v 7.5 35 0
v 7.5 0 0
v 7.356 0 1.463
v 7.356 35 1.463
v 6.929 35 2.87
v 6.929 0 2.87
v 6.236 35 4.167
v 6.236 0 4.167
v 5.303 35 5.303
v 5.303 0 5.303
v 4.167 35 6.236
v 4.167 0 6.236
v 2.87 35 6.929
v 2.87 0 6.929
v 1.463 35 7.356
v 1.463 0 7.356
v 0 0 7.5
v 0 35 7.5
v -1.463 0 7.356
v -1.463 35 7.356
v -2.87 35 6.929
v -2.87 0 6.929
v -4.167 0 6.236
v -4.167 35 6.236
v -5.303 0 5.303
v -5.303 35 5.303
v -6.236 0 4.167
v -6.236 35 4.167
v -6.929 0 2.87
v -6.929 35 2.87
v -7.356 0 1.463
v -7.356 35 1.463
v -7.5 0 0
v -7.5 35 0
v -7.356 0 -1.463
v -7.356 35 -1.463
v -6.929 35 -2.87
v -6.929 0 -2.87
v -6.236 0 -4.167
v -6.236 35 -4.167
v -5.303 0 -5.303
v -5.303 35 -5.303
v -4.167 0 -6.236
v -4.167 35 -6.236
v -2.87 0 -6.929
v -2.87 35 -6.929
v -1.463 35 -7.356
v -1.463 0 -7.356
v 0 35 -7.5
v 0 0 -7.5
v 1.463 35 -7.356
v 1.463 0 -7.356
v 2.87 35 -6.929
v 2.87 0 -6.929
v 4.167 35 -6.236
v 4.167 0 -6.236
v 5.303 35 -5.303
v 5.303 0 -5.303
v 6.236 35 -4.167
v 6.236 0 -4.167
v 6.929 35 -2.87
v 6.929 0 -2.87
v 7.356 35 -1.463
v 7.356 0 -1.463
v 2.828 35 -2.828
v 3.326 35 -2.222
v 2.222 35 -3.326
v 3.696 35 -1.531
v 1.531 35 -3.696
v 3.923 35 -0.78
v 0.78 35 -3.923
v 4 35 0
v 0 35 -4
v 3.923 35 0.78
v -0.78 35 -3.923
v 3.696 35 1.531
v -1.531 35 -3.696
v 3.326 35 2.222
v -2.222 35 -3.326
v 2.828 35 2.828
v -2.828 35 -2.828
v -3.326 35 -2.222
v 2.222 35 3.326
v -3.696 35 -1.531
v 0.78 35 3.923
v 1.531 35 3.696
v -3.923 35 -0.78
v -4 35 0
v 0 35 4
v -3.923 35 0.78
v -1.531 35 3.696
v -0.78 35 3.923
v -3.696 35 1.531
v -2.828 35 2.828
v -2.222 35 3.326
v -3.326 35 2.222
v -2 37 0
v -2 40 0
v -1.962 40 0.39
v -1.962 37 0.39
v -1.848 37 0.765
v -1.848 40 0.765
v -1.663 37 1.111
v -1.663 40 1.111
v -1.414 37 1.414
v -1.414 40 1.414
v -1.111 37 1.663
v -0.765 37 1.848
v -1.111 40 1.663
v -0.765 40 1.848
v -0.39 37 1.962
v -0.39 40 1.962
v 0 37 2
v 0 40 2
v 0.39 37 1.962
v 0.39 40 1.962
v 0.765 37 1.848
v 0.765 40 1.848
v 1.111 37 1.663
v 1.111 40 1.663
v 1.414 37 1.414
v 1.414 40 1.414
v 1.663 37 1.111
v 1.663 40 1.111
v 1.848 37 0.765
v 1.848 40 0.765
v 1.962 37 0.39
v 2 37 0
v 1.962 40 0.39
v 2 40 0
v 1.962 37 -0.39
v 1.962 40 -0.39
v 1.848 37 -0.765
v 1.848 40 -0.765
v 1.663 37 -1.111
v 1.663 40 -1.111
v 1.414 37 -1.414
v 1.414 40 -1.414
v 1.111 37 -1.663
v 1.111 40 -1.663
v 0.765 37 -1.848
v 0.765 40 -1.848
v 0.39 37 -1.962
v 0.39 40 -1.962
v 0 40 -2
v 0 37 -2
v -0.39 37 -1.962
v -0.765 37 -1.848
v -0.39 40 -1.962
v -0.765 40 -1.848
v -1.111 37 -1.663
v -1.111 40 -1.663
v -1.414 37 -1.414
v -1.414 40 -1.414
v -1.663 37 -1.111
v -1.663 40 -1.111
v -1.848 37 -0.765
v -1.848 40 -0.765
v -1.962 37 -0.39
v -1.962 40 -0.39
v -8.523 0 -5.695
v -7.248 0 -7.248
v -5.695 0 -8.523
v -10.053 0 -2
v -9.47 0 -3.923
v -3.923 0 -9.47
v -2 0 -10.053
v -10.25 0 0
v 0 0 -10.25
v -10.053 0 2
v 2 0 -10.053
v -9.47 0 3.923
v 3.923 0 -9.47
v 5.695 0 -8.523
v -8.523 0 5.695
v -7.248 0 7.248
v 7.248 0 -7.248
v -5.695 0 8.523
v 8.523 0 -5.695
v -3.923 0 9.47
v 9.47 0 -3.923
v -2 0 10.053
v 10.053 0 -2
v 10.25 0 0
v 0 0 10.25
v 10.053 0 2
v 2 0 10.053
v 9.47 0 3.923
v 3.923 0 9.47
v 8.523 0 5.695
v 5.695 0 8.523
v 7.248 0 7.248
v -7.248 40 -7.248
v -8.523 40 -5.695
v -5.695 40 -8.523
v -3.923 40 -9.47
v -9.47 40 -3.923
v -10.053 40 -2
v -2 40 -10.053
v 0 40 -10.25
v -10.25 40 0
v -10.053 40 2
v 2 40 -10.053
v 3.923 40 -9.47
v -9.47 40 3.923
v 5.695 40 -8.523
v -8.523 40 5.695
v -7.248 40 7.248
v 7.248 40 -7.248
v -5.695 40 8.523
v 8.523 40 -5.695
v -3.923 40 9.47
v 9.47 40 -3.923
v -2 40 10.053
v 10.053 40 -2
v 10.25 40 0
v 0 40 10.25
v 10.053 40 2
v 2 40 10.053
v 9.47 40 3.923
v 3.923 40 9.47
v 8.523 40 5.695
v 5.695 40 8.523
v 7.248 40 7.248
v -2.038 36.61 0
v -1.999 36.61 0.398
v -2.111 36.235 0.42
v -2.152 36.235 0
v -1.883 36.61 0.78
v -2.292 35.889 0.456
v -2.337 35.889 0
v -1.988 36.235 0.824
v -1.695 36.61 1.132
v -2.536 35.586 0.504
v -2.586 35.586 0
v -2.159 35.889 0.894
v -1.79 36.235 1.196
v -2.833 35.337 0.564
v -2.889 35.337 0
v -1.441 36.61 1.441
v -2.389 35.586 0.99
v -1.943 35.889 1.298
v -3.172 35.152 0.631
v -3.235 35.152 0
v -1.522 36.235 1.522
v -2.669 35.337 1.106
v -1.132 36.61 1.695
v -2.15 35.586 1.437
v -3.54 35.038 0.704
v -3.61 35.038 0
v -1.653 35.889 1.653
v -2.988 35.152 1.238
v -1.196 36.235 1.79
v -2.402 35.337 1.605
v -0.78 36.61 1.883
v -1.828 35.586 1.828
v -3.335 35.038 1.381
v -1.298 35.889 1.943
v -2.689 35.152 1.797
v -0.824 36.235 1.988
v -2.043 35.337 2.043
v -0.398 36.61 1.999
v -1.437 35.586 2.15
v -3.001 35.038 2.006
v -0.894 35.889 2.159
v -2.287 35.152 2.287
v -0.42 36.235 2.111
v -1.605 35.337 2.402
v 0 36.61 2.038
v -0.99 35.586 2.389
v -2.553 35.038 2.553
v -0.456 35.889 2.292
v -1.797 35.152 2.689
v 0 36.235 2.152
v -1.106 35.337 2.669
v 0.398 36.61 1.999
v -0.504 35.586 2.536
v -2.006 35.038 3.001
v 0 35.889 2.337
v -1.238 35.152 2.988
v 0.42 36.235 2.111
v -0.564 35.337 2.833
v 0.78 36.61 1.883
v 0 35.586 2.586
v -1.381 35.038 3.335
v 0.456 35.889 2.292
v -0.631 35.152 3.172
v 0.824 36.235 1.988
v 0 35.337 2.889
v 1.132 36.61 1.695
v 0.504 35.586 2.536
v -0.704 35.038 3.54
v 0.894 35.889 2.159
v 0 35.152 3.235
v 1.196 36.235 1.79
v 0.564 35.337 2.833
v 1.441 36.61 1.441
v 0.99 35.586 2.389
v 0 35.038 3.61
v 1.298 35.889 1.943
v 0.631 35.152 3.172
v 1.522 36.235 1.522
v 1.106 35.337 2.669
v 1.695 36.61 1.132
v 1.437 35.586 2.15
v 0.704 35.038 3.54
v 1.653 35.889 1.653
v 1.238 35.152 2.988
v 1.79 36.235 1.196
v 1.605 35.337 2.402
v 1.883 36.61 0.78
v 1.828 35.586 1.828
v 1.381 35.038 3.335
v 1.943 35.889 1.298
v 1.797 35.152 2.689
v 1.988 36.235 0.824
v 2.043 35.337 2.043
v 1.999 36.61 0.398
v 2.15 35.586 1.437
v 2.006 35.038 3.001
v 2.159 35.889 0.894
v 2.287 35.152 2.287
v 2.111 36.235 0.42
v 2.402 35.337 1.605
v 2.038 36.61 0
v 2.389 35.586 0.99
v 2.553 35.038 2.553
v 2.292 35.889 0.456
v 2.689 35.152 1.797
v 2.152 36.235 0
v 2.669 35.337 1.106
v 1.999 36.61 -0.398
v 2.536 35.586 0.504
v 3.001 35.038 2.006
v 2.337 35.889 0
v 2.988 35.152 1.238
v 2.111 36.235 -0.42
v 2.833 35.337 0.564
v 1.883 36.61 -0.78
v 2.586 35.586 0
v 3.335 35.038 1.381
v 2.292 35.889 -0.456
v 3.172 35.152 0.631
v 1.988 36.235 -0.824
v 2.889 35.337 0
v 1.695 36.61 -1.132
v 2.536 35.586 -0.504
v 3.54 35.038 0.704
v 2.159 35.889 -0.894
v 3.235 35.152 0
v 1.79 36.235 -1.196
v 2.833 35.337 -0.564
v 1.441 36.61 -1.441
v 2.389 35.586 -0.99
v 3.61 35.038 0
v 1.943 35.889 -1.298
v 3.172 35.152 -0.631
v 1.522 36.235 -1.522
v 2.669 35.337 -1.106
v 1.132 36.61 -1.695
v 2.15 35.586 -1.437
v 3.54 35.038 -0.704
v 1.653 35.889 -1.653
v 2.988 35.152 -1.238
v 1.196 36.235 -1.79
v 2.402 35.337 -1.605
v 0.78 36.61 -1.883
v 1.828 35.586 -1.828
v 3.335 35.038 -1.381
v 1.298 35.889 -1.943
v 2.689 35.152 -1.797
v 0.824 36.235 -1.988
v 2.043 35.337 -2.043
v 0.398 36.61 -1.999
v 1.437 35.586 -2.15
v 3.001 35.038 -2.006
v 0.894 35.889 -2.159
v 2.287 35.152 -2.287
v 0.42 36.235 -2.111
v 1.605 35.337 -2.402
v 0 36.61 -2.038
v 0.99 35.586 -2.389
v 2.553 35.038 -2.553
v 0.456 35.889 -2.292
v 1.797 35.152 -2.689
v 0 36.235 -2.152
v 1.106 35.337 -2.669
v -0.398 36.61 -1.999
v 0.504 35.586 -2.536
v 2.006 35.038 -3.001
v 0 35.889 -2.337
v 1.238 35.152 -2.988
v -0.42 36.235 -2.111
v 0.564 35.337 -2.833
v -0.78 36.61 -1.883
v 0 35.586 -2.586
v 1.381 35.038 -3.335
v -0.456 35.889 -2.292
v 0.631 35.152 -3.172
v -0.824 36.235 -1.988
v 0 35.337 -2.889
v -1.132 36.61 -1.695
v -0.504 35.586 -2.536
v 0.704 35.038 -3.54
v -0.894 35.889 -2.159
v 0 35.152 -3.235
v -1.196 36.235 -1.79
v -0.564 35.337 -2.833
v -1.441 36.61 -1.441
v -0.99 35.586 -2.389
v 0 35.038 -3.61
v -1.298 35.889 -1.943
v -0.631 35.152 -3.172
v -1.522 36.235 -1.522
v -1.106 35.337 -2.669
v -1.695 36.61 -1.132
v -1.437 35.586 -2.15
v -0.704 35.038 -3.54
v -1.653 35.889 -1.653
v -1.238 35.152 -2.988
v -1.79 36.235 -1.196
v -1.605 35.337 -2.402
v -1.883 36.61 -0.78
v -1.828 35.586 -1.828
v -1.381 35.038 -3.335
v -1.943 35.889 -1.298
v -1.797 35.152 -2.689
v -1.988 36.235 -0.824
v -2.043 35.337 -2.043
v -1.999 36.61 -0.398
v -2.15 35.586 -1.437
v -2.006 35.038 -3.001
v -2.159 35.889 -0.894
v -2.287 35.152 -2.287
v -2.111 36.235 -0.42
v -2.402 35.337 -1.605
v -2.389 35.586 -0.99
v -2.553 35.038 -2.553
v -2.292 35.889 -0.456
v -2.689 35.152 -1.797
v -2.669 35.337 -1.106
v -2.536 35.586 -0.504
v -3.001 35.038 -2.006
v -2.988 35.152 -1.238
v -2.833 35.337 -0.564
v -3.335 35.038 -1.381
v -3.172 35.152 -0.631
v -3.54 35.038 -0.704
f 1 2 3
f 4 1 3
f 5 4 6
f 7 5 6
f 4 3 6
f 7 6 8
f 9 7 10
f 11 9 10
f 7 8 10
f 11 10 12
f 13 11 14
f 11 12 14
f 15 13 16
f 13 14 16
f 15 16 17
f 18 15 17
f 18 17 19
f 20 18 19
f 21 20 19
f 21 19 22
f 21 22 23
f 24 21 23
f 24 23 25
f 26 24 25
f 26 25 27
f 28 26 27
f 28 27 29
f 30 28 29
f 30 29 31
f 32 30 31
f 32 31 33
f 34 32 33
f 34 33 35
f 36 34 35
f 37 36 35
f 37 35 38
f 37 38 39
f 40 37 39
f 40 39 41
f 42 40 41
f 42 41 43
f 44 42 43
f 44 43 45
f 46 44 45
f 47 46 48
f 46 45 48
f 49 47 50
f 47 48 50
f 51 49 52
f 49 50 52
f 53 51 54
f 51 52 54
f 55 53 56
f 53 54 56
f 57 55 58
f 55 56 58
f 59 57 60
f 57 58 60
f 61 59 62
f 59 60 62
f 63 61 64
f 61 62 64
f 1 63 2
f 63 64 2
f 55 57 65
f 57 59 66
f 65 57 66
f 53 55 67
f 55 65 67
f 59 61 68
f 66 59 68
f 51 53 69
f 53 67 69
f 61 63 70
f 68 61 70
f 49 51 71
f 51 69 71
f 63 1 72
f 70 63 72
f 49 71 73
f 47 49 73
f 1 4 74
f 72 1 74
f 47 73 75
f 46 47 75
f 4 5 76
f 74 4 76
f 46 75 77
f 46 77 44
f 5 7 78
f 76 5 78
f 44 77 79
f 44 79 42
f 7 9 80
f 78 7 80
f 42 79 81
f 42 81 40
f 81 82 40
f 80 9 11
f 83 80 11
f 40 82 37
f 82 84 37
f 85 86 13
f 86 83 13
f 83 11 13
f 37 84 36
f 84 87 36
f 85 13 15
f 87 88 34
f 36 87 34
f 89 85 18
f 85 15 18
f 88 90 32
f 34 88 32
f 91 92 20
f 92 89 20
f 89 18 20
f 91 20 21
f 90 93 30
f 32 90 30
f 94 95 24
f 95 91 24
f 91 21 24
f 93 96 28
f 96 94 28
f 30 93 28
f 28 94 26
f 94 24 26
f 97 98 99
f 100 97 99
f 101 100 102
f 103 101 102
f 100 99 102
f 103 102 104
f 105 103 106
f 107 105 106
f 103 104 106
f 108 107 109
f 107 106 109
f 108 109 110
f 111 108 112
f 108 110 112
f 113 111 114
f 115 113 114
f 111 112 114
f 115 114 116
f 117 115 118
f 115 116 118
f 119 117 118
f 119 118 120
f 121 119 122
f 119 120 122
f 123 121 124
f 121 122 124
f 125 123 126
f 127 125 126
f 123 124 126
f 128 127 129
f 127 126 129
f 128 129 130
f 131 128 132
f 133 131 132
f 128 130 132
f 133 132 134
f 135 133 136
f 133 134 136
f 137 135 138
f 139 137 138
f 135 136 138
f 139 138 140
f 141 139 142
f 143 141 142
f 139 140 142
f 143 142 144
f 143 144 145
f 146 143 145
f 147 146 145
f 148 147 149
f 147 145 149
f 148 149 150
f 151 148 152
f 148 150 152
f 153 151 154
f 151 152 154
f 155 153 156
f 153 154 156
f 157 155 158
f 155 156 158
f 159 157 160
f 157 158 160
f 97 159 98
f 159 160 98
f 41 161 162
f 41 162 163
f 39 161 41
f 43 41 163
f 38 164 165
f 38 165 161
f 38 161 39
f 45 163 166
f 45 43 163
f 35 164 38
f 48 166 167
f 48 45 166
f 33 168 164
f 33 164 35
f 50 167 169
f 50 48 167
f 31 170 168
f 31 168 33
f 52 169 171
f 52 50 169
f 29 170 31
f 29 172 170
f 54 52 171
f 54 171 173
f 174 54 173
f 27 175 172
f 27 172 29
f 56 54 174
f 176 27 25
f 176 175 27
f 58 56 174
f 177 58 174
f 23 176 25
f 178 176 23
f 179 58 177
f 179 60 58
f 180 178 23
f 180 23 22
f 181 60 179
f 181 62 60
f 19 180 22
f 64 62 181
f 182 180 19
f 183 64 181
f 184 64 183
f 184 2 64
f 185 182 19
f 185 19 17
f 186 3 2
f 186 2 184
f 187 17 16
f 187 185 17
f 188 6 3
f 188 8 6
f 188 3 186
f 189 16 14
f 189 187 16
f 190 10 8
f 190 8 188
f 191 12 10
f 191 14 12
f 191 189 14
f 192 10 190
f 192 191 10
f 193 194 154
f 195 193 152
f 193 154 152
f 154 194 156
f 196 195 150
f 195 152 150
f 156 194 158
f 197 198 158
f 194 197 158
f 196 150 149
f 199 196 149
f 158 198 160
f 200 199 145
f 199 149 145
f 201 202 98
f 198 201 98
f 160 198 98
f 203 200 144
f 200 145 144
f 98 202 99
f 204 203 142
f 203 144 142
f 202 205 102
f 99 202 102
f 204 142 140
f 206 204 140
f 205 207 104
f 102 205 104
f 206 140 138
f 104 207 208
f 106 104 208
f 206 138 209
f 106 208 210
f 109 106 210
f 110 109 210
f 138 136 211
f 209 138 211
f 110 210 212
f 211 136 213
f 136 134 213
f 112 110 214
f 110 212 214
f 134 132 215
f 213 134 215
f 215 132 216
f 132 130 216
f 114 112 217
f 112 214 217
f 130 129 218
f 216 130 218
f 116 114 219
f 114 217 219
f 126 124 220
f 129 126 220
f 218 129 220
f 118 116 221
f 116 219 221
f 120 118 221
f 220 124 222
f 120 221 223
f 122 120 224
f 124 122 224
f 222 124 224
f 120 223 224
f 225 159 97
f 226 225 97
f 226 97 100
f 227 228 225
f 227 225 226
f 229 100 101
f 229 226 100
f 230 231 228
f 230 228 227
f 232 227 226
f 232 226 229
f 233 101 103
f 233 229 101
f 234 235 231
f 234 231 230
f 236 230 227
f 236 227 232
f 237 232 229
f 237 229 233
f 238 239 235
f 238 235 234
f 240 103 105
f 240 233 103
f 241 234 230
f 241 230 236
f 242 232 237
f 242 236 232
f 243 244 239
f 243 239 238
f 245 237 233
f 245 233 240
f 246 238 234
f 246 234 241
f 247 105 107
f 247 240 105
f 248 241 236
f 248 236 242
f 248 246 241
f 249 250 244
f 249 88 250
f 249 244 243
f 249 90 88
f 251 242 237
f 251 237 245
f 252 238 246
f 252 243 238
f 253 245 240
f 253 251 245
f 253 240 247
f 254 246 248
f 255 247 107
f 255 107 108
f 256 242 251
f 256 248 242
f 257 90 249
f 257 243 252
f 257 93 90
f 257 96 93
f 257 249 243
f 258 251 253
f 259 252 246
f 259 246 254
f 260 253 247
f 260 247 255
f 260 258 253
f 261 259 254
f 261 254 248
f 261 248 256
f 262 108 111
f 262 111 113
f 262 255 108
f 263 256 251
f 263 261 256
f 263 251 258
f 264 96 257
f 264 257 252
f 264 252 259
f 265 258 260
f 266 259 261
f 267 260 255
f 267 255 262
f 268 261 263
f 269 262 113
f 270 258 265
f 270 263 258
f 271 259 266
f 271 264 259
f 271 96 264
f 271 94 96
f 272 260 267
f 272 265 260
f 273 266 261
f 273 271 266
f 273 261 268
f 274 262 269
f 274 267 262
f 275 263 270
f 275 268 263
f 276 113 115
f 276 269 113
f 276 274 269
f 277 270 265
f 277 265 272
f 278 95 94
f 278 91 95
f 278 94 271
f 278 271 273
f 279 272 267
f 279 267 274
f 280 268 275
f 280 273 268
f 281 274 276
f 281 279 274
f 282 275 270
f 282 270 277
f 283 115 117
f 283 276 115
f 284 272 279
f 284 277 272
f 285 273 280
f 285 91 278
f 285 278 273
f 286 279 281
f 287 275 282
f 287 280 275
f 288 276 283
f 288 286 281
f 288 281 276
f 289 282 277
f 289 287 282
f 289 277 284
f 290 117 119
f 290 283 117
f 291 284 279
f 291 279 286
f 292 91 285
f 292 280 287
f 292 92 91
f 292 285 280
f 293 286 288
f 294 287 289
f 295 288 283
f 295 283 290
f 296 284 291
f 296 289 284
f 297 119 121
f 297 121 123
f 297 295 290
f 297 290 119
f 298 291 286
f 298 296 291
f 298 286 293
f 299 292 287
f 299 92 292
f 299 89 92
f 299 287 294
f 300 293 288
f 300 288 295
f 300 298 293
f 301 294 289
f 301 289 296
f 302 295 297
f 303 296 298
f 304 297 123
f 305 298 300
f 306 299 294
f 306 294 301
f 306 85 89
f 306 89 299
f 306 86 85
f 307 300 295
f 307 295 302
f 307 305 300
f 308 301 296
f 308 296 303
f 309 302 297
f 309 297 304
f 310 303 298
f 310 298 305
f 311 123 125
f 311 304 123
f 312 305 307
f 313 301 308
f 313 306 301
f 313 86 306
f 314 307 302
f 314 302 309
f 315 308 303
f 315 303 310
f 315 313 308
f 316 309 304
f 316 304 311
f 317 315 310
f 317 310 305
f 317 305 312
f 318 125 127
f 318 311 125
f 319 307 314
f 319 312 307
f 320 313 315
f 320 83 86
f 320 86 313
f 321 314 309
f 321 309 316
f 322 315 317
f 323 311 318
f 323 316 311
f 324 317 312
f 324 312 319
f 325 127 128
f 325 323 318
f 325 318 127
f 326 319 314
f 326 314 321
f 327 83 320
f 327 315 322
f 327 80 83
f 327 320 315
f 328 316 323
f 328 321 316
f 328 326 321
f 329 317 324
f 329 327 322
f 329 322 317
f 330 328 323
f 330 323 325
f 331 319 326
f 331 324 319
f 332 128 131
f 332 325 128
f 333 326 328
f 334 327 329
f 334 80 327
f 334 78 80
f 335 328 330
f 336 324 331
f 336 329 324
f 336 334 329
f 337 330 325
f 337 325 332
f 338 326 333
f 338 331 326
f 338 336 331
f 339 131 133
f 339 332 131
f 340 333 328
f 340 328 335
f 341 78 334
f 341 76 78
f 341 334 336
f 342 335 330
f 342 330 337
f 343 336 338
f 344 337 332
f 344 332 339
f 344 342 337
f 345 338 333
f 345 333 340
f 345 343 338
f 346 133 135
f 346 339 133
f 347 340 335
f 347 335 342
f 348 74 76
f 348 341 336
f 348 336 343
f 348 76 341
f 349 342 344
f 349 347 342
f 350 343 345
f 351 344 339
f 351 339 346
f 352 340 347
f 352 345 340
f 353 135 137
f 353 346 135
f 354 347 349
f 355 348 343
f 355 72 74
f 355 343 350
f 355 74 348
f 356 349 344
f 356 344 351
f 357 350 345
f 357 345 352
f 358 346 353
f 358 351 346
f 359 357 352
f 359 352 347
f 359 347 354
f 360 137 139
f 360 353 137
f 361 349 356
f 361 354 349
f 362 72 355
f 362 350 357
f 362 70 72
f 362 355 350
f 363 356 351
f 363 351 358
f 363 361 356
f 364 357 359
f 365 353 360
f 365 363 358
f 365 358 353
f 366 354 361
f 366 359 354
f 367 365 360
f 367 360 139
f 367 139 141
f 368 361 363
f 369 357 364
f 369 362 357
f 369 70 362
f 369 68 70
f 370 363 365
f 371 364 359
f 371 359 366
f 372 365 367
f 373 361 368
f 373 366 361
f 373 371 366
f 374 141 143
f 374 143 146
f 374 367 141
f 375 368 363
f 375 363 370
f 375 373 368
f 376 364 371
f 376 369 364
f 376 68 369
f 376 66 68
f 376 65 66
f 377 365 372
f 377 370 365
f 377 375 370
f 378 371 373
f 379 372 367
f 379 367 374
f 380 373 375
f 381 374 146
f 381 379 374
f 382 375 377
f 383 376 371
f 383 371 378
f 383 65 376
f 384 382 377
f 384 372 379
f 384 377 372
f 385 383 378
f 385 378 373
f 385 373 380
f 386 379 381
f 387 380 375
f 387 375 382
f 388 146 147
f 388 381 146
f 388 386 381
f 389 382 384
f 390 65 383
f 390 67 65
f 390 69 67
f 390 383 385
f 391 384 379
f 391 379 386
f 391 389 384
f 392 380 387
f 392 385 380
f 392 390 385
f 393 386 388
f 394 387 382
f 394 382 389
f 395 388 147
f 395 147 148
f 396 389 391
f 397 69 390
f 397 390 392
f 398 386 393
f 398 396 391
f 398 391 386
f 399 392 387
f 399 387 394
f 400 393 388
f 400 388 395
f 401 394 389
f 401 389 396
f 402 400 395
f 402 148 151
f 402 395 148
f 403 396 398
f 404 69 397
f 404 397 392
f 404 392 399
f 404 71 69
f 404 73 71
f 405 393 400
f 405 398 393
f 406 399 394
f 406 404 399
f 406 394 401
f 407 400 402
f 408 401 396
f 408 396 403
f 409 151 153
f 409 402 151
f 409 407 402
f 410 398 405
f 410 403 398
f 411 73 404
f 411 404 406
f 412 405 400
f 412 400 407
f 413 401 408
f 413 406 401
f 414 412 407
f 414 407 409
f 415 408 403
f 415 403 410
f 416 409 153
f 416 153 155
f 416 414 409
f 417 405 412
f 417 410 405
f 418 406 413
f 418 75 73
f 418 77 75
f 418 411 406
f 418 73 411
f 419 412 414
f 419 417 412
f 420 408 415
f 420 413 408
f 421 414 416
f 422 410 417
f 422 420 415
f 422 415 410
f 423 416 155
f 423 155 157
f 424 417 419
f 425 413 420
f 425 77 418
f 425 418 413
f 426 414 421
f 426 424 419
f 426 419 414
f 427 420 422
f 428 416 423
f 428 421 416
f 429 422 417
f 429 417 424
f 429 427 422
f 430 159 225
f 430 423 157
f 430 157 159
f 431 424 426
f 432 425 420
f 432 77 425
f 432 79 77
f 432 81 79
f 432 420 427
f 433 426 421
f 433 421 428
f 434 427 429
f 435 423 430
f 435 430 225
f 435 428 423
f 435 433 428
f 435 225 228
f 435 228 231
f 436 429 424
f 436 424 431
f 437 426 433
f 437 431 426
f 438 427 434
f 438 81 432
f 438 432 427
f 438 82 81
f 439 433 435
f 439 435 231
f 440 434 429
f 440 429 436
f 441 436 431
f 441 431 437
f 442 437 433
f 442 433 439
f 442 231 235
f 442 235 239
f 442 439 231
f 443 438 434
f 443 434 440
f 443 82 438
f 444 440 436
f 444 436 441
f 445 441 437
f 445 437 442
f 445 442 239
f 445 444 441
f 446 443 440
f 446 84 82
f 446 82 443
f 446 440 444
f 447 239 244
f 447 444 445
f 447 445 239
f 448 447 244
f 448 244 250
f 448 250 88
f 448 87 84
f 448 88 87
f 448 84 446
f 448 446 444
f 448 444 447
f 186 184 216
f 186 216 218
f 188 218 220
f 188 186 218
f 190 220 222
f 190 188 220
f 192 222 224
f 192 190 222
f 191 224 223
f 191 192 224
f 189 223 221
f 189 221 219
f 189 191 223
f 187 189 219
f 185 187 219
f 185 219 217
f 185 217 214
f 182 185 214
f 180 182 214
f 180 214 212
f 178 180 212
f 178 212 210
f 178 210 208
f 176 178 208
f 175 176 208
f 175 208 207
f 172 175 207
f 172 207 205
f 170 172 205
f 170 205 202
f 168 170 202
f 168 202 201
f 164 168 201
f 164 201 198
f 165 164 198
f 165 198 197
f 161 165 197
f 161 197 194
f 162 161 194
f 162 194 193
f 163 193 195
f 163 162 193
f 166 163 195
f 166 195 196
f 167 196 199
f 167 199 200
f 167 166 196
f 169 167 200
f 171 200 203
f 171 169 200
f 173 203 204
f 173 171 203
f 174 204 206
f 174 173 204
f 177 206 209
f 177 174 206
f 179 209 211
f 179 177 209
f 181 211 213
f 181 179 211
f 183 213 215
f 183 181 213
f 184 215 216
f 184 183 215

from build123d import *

# Parameters (mm, degrees)
F0_R     = 10.25
F0_R_2   = 7.5
F1_DEPTH = 40
F2_R     = 10.25
F2_R_2   = 7.5
F2_R_3   = 2
F3_DEPTH = 5
F4_R     = 2


with BuildPart() as f1:
    # F0 (on Front) → F1 (new body)
    with BuildSketch(Plane.XZ):
        Circle(F0_R)
        Circle(F0_R_2, mode=Mode.SUBTRACT)
    extrude(amount=-F1_DEPTH)

    # F2 (on face) → F3 (join)
    with BuildSketch(Plane(origin=(0, 40, 0), x_dir=(-1, 0, 0), z_dir=(0, 1, 0))):
        Circle(F2_R)
        Circle(F2_R_2, mode=Mode.SUBTRACT)
        Circle(F2_R_2)
        Circle(F2_R_3, mode=Mode.SUBTRACT)
    extrude(amount=-F3_DEPTH)

    # F4
    f4_edges = [f1.edges().sort_by_distance(p)[0] for p in [
        (2, 35, 0),
    ]]
    fillet(f4_edges, radius=F4_R)


solid = f1.part
